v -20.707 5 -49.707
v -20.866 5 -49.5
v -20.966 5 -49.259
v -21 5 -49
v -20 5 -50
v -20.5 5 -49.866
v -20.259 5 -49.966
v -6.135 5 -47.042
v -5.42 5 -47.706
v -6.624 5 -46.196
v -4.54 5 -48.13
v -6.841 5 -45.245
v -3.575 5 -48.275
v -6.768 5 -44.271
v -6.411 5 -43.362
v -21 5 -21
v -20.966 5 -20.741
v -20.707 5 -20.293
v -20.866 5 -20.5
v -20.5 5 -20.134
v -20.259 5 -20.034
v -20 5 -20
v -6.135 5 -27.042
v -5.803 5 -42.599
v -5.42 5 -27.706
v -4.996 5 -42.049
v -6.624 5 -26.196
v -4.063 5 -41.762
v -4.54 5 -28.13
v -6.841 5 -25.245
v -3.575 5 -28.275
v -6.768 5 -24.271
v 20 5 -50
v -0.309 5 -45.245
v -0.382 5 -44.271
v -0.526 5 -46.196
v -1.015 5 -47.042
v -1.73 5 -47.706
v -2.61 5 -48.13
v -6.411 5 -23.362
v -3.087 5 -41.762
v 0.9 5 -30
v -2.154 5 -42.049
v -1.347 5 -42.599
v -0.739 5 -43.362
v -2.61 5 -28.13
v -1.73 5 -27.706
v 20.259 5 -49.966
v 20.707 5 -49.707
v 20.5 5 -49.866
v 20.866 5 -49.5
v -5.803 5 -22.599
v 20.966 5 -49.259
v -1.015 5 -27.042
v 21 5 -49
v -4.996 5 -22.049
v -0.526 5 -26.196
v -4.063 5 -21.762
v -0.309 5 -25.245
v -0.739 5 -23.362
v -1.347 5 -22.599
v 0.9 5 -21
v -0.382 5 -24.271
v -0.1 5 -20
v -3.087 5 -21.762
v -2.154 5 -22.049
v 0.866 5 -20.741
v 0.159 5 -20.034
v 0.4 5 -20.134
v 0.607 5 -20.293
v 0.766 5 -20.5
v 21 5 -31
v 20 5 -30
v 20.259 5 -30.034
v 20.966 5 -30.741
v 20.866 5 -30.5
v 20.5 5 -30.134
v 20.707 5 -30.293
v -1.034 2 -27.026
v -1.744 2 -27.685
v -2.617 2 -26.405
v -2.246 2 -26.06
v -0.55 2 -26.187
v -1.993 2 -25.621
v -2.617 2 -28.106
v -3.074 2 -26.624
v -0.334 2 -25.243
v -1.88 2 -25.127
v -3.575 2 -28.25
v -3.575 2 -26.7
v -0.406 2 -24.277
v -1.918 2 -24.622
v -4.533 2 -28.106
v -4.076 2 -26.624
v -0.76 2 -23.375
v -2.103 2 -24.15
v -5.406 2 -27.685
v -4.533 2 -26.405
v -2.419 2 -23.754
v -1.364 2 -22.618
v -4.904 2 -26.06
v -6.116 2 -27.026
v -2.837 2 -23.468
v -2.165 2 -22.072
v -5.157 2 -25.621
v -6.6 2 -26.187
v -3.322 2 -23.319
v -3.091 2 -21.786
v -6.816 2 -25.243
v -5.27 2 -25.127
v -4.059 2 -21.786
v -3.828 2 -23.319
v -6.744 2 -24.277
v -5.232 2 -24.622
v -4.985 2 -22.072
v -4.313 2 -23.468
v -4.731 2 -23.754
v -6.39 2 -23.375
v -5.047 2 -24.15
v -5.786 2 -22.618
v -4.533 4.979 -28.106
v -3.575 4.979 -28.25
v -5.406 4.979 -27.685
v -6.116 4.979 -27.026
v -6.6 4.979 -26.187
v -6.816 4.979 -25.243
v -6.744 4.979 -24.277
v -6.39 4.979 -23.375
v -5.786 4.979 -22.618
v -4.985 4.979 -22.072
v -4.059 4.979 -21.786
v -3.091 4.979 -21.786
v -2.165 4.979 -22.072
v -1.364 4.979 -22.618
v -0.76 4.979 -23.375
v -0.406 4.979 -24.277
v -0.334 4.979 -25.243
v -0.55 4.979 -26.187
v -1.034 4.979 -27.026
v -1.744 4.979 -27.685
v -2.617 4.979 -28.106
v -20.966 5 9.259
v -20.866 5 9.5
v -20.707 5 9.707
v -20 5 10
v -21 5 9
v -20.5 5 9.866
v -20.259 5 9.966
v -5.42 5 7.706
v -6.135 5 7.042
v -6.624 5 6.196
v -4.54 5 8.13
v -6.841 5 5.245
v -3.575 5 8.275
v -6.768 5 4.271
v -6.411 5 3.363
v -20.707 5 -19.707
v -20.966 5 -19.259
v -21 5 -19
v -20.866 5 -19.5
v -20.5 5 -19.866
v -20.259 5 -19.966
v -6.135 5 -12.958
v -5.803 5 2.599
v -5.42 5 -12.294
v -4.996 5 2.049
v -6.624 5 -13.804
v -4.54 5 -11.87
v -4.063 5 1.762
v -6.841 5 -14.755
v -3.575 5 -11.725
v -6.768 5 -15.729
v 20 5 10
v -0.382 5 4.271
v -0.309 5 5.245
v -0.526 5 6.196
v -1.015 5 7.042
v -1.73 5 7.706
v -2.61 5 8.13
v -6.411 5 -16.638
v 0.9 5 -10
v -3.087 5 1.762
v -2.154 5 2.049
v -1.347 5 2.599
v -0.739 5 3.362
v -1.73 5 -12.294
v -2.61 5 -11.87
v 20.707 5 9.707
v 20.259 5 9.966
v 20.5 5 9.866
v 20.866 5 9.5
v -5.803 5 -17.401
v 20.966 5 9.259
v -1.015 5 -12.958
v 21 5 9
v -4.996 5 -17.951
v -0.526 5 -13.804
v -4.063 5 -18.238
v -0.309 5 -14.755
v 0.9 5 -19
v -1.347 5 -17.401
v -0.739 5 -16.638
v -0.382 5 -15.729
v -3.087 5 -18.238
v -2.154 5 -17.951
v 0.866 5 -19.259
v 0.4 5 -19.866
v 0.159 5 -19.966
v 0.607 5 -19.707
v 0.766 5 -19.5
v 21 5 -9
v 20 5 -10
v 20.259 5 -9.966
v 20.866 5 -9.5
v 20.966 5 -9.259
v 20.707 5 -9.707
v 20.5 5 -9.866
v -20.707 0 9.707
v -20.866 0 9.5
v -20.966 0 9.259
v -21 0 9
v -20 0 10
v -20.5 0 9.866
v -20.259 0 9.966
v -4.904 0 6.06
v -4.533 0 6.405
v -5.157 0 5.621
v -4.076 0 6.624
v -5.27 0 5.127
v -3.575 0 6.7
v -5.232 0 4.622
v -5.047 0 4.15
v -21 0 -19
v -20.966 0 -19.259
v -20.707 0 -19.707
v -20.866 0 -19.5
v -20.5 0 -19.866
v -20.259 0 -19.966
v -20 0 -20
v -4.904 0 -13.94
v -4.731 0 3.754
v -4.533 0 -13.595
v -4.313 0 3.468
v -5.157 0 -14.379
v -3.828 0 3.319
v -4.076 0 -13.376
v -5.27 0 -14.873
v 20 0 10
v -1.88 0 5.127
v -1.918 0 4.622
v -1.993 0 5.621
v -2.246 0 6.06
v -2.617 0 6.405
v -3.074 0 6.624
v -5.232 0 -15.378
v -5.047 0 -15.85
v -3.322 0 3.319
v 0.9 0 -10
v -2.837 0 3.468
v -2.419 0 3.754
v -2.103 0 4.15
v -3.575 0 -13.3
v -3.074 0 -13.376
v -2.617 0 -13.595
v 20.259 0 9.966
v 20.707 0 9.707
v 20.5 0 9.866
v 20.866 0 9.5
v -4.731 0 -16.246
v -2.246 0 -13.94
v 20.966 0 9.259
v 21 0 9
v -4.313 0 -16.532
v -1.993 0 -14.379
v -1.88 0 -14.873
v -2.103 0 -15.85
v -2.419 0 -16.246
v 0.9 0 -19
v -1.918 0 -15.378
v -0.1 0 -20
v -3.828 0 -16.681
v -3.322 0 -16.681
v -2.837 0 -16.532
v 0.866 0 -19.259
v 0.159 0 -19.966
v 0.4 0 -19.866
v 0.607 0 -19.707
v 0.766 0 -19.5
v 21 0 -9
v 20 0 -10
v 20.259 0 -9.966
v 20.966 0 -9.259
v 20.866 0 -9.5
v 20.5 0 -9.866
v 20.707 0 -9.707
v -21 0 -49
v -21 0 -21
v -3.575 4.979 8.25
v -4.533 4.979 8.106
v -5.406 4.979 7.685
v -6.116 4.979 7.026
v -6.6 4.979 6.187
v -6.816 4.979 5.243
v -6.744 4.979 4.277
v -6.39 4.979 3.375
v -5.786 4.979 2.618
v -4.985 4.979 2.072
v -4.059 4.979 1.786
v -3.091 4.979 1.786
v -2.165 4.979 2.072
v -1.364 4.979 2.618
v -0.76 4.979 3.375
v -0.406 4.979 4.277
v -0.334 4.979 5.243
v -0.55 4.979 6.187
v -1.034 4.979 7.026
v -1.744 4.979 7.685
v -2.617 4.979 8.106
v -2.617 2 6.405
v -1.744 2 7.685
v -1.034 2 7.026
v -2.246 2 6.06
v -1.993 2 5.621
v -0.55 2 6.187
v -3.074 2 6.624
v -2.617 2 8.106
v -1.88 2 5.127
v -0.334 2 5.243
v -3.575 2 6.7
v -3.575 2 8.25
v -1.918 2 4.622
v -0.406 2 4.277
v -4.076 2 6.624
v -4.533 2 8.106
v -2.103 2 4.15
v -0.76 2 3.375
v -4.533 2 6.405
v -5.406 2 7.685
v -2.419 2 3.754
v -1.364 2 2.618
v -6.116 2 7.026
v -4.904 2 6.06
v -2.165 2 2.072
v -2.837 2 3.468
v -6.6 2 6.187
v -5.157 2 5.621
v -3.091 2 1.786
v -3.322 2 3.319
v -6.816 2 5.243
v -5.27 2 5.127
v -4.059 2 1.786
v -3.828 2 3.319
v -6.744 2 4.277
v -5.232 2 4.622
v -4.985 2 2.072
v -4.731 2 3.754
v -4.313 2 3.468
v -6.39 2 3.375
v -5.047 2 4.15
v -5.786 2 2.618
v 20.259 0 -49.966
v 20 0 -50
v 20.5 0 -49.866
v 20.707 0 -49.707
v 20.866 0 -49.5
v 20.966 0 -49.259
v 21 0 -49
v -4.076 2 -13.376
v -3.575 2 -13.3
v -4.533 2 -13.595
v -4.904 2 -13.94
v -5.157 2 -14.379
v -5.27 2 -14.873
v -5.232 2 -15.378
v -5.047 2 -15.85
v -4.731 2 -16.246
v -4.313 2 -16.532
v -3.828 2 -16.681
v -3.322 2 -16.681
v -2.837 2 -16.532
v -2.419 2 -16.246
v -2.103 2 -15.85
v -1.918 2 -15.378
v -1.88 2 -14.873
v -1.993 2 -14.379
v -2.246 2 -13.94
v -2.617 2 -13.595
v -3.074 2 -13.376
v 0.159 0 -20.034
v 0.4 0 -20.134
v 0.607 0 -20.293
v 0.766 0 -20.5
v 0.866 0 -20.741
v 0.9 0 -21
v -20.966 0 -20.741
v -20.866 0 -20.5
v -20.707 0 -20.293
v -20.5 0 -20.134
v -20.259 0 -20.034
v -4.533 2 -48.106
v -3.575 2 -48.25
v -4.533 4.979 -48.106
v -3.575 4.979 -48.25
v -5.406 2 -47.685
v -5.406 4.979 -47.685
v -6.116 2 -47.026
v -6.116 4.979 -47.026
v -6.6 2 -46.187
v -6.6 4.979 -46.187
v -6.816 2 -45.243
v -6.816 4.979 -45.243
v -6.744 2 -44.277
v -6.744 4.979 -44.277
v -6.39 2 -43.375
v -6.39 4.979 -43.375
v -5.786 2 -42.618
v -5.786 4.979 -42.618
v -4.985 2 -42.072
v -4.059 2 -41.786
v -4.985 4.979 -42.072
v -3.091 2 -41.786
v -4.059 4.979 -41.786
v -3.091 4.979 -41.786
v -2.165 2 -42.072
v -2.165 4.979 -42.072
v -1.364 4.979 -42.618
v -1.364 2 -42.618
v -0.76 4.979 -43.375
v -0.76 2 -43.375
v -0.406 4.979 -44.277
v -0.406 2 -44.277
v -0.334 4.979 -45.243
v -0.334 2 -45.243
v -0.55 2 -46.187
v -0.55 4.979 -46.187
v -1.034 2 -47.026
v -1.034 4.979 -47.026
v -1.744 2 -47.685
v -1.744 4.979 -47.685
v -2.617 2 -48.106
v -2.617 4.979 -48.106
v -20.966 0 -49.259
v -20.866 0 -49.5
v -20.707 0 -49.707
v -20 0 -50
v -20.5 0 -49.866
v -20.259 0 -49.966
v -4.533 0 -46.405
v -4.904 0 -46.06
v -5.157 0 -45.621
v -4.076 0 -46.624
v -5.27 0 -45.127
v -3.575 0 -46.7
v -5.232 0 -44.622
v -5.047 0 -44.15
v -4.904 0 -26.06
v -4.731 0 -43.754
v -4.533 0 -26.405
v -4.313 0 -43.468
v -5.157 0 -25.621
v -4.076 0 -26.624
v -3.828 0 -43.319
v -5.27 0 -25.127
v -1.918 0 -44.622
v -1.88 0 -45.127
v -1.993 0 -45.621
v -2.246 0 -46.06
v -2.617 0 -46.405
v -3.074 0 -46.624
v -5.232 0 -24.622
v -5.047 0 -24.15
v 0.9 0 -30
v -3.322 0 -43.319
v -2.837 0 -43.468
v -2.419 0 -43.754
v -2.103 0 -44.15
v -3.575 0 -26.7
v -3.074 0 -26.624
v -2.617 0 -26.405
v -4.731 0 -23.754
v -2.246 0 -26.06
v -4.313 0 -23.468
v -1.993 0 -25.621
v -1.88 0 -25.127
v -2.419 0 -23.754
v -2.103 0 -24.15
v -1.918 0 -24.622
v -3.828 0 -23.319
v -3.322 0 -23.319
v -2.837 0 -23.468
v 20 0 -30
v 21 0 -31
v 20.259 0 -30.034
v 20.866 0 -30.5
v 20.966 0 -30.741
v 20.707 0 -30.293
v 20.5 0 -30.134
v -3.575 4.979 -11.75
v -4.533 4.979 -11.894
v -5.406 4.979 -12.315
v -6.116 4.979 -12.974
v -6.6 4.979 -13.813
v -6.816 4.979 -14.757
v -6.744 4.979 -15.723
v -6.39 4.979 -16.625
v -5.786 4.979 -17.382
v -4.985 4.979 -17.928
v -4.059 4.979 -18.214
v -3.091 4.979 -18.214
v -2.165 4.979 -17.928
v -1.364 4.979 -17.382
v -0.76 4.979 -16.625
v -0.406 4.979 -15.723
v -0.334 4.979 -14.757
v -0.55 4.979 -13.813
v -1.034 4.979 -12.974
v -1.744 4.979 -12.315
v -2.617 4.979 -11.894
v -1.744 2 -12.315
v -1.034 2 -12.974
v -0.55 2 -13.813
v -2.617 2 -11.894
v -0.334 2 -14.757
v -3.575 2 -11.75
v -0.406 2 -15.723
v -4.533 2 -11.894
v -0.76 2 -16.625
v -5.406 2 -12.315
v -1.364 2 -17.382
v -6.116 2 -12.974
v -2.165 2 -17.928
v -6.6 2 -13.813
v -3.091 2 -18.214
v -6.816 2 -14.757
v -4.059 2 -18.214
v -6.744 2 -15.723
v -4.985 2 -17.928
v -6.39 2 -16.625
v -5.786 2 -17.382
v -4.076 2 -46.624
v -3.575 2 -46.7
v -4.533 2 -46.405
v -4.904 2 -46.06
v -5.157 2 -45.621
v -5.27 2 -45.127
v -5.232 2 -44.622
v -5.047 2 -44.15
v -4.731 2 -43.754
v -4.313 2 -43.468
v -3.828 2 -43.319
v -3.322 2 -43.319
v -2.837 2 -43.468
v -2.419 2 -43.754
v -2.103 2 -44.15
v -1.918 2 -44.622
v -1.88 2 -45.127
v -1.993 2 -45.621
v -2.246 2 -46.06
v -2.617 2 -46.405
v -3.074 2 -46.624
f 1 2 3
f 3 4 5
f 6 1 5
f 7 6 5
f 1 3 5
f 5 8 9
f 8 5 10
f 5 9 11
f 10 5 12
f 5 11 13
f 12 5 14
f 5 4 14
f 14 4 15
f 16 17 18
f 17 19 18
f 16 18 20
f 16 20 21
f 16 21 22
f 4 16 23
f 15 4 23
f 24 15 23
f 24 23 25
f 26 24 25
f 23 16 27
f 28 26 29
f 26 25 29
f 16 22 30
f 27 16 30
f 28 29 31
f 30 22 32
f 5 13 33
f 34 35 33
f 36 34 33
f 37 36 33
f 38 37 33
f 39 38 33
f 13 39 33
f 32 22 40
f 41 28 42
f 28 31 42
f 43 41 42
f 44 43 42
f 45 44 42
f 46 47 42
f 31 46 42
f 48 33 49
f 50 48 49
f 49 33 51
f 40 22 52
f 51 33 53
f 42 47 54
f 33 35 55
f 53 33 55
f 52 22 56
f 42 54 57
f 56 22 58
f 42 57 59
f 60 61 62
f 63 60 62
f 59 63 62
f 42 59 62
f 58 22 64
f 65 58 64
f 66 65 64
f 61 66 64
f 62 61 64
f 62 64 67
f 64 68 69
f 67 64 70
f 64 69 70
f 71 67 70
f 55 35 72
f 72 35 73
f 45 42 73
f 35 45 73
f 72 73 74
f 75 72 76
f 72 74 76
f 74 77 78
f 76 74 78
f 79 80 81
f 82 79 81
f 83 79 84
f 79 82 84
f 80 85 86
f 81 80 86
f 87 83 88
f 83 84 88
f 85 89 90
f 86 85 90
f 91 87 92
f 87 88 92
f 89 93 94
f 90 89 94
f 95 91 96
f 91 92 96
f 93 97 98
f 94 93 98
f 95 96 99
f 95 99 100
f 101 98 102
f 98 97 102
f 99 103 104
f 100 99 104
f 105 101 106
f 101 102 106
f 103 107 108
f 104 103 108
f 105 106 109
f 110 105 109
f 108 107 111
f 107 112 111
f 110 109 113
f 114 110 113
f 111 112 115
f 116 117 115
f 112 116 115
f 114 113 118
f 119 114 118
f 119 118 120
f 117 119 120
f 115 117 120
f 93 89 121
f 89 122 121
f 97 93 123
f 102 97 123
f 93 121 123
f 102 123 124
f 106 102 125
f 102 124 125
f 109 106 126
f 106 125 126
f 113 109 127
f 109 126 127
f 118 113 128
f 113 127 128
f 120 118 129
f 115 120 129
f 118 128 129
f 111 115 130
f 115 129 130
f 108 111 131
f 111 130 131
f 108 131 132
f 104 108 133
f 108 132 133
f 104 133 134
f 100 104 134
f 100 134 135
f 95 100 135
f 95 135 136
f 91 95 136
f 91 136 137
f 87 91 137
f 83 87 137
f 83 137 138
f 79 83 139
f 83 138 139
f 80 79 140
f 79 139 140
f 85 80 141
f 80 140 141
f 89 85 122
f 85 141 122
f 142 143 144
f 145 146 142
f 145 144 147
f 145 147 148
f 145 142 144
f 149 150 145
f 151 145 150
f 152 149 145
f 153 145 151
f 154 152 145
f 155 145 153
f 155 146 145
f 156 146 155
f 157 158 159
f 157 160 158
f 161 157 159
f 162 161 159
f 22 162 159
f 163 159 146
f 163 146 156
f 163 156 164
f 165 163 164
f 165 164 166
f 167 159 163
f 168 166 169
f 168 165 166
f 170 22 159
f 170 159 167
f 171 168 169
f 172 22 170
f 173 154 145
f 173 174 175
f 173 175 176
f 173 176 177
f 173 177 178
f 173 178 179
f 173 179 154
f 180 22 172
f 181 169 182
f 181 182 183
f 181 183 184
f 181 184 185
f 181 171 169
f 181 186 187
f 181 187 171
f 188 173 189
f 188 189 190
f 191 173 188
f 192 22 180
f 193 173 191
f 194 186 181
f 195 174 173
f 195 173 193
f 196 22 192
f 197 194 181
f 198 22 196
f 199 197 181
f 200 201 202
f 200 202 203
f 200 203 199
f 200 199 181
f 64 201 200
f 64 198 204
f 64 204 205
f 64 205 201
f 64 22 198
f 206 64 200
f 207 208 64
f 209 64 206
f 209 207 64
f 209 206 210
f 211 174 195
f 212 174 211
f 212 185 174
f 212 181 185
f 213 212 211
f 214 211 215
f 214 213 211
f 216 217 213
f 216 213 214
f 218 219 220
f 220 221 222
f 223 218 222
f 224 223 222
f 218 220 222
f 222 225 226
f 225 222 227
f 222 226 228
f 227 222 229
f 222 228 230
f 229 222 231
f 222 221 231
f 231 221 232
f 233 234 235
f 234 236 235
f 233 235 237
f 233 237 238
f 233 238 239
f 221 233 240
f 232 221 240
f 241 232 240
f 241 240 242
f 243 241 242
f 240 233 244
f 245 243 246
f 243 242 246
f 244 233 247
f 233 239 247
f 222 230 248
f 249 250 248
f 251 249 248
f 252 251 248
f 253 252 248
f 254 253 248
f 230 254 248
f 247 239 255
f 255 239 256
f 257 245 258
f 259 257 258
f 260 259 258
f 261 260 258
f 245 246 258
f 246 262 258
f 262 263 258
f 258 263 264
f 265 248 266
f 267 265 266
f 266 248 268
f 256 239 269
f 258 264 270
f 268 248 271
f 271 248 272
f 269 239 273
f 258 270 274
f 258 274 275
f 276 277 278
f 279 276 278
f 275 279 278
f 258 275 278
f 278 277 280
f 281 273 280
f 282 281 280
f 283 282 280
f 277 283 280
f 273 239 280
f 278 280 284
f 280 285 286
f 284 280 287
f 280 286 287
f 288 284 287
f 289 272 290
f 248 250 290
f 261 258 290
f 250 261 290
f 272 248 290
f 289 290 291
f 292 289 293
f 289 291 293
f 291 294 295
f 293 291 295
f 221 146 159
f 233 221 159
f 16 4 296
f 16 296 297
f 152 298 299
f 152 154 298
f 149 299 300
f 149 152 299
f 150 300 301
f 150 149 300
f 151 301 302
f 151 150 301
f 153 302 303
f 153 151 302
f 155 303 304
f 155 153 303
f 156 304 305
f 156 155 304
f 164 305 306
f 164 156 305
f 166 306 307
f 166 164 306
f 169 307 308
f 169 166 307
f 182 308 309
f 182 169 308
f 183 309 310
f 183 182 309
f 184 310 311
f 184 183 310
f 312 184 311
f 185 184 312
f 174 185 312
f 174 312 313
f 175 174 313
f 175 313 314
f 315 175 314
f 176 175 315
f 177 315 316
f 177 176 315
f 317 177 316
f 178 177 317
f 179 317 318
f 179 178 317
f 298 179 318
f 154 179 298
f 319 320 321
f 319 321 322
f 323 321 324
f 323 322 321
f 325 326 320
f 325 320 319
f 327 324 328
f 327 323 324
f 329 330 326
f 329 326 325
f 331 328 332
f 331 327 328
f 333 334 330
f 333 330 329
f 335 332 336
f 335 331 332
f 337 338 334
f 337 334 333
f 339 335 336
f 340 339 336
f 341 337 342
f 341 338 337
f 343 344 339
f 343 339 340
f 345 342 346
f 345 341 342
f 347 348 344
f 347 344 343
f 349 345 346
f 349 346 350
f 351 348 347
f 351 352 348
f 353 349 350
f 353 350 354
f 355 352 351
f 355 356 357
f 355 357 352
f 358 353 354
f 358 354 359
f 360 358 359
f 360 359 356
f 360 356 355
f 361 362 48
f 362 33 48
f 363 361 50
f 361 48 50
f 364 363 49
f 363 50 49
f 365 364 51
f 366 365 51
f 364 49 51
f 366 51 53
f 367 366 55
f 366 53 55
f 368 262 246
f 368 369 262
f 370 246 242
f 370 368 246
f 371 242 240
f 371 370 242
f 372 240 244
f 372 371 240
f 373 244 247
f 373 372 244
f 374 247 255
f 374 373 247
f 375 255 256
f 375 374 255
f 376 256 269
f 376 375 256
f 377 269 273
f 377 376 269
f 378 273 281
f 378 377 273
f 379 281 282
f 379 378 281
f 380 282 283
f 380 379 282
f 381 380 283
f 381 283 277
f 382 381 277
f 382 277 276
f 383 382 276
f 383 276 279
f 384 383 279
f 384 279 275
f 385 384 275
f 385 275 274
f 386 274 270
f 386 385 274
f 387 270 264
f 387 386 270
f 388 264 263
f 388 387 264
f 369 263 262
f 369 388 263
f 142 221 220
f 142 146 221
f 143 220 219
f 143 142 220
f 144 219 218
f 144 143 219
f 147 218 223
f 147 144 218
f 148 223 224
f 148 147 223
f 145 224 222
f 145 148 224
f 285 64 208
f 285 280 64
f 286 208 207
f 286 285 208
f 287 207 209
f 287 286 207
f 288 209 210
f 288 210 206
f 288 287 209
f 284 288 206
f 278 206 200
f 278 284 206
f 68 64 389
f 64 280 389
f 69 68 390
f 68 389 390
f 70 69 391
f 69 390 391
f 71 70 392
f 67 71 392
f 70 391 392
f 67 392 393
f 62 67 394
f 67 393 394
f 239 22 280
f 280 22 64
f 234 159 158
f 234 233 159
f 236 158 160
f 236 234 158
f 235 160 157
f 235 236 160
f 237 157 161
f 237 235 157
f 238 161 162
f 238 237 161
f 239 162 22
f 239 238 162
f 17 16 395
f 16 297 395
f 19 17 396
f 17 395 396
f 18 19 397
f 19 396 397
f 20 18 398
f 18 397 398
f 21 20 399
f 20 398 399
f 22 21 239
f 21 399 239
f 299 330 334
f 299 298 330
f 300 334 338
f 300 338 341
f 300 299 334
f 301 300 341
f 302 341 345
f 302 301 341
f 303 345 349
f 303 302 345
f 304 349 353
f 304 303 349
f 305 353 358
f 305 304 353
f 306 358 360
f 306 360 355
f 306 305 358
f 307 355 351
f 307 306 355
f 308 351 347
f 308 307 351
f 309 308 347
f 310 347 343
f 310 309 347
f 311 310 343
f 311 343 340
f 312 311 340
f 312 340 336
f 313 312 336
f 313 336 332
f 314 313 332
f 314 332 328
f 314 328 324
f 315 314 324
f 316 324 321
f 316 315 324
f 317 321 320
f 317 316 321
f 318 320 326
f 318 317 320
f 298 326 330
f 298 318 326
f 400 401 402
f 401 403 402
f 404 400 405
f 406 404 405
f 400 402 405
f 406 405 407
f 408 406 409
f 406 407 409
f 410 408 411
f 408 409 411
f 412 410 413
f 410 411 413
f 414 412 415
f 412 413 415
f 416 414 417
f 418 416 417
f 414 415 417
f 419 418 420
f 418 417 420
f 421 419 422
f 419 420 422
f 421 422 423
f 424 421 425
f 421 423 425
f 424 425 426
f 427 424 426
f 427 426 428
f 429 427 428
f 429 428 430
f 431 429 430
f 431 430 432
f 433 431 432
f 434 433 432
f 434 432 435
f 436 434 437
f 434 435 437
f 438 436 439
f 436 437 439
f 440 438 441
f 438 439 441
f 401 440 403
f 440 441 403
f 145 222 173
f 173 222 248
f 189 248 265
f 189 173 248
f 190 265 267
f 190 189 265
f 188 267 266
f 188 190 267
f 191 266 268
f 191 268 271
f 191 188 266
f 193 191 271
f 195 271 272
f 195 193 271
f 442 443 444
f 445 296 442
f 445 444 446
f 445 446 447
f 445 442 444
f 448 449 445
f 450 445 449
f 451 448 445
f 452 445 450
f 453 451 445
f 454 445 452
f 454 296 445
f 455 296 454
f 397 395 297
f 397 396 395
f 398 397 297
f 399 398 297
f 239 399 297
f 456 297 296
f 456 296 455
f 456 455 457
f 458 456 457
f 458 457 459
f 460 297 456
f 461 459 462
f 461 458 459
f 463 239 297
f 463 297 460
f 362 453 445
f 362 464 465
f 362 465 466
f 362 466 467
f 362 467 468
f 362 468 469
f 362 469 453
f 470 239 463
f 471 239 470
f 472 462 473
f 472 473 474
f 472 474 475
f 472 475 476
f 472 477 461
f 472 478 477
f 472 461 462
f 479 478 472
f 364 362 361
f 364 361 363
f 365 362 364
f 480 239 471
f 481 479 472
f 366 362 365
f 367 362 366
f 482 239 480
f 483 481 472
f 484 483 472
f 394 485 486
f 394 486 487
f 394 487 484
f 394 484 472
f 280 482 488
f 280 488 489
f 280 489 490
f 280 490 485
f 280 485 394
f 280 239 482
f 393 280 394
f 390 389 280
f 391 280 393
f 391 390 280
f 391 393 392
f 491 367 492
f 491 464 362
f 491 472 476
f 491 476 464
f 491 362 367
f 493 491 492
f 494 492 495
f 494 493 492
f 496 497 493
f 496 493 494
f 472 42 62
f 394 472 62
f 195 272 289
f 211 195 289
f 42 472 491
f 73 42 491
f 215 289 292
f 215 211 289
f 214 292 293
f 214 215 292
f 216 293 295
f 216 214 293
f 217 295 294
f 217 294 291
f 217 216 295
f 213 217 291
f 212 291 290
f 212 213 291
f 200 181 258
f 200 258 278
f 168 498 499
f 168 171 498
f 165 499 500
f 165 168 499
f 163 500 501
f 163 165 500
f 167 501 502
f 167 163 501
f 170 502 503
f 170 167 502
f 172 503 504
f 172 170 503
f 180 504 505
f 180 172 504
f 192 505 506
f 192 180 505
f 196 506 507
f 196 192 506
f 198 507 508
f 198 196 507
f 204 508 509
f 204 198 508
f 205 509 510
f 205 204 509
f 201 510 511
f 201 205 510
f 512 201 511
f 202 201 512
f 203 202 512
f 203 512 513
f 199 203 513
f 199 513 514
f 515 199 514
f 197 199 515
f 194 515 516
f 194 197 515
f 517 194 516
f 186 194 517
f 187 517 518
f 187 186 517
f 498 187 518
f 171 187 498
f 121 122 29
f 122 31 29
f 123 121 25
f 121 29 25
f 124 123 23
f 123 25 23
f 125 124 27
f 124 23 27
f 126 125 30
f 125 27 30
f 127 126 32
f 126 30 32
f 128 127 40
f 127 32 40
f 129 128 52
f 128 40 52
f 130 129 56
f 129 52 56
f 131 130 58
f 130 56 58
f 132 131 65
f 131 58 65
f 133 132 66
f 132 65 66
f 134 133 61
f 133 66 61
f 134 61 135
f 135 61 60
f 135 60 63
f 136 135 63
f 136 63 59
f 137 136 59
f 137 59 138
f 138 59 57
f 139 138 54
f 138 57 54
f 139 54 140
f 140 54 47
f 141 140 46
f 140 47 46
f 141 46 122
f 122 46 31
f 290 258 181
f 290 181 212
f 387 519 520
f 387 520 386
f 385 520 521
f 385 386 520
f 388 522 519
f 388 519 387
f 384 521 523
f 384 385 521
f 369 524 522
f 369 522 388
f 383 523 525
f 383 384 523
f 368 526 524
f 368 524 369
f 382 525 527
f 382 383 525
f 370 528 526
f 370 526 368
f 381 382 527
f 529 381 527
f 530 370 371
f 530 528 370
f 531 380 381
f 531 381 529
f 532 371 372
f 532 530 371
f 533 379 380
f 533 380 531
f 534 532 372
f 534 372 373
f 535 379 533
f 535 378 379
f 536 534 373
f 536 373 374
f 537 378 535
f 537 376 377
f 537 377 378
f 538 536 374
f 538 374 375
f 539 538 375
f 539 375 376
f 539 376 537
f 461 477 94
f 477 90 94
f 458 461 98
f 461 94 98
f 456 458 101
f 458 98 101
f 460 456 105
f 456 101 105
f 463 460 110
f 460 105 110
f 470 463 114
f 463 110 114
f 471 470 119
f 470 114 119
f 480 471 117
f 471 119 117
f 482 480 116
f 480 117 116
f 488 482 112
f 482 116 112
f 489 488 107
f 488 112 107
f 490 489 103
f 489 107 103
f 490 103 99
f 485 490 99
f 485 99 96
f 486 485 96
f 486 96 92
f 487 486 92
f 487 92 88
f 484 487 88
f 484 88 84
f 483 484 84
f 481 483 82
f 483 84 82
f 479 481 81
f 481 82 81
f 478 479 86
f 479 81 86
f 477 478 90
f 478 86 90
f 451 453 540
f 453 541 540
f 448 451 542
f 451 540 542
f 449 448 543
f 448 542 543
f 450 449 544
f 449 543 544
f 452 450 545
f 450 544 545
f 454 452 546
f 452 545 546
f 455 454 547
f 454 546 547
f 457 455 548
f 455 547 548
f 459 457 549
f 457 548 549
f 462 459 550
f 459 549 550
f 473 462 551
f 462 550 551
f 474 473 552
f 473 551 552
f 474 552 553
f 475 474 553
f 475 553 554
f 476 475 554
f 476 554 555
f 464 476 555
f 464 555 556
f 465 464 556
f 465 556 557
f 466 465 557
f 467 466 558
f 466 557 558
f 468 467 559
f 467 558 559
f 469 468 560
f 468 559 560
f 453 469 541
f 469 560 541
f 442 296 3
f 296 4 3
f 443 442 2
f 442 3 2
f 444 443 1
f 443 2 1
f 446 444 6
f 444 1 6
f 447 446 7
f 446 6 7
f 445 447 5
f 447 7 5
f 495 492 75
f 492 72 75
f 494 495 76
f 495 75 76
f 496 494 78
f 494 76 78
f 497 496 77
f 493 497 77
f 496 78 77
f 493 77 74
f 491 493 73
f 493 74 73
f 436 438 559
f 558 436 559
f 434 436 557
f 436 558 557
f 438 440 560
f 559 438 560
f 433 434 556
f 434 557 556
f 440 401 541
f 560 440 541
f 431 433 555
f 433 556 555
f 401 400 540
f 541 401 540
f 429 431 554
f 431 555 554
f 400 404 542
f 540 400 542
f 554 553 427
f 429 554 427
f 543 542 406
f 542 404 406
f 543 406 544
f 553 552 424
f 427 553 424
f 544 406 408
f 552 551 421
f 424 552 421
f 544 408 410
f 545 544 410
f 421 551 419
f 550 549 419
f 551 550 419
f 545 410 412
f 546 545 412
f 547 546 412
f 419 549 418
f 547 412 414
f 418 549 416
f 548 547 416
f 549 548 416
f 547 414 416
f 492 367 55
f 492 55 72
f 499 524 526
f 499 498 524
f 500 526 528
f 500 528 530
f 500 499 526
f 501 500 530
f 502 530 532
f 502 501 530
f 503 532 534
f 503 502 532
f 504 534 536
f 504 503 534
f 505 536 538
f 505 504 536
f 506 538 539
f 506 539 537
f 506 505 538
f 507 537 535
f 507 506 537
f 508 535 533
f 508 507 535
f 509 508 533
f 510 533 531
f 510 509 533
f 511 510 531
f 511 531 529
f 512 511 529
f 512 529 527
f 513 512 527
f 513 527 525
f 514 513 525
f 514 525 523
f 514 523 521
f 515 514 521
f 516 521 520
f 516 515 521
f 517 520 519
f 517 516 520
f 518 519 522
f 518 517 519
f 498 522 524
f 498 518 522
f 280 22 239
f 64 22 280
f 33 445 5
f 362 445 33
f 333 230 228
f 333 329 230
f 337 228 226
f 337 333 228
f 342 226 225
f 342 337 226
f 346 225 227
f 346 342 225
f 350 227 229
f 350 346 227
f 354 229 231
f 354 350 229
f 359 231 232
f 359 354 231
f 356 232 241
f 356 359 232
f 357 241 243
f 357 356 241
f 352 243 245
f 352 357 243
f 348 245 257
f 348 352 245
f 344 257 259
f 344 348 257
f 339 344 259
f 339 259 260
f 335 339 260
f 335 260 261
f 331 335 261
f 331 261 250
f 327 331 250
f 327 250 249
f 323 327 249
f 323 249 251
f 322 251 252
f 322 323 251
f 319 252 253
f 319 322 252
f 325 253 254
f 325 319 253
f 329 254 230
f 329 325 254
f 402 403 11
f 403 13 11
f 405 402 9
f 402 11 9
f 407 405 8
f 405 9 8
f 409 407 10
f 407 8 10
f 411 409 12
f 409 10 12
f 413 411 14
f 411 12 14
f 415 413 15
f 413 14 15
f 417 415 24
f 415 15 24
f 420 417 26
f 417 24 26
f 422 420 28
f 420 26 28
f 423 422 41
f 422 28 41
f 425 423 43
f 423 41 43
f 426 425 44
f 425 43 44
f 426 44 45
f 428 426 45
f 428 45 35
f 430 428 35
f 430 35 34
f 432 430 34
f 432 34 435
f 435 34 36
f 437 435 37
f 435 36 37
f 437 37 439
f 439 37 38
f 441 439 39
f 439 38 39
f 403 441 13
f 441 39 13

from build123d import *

# Parameters (mm, degrees)
SKETCH1_W                     = 42
SKETCH1_H                     = 20
BOSS_EXTRUDE1_DEPTH           = 5
SKETCH2_W                     = 21.9
SKETCH2_H                     = 10
BOSS_EXTRUDE2_DEPTH           = 5
CBORE_FOR_M3_SHCS1_AT_2_COUNT = 2
CBORE_FOR_M3_SHCS1_AT_2_PITCH = 20
FILLET1_R                     = 1


with BuildPart() as part:
    # Sketch1 → Boss-Extrude1 (new body)
    with BuildSketch(Plane(origin=(0, 0, 0), x_dir=(1, 0, 0), z_dir=(0, 1, 0))):
        Rectangle(SKETCH1_W, SKETCH1_H)
    extrude(amount=BOSS_EXTRUDE1_DEPTH)

    # Sketch2 → Boss-Extrude2 (add)
    with BuildSketch(Plane(origin=(0, 5, 0), x_dir=(1, 0, 0), z_dir=(0, 1, 0))):
        with Locations((-10.05, 15)):
            Rectangle(SKETCH2_W, SKETCH2_H)
    extrude(amount=-BOSS_EXTRUDE2_DEPTH)

    # Sketch7 → CBORE for M3 SHCS1 (revolve, cut)
    with BuildSketch(Plane(origin=(-3.575, 5, -15), x_dir=(0, 0, 1), z_dir=(1, 0, 0))):
        Polygon((0, 0), (0, 5), (1.7, 5), (1.7, 3), (3.25, 3), (3.25, 0.020977491), (3.275, 0), align=None)
    cbore_for_m3_shcs1 = revolve(axis=Axis((-3.575, 11.35, -15), (0, -1, 0)), mode=Mode.SUBTRACT)

    # CBORE for M3 SHCS1 at 2: CBORE for M3 SHCS1 ×2
    with Locations(*[(0, 0, i * CBORE_FOR_M3_SHCS1_AT_2_PITCH) for i in range(1, CBORE_FOR_M3_SHCS1_AT_2_COUNT)]):
        add(cbore_for_m3_shcs1, mode=Mode.SUBTRACT)

    # Fillet1
    fillet1_edges = [part.edges().sort_by_distance(p)[0] for p in [
        (-21, 2.5, -20),
        (0.9, 2.5, -20),
        (21, 2.5, -10),
        (21, 2.5, 10),
        (-21, 2.5, 10),
    ]]
    fillet(fillet1_edges, radius=FILLET1_R)


with BuildPart() as body_2:
    # Mirror1: mirrored copy
    add(part.part.mirror(Plane(origin=(-21, 0, -20), x_dir=(1, 0, 0), z_dir=(0, 0, -1))))


solid = Compound([part.part, body_2.part])
